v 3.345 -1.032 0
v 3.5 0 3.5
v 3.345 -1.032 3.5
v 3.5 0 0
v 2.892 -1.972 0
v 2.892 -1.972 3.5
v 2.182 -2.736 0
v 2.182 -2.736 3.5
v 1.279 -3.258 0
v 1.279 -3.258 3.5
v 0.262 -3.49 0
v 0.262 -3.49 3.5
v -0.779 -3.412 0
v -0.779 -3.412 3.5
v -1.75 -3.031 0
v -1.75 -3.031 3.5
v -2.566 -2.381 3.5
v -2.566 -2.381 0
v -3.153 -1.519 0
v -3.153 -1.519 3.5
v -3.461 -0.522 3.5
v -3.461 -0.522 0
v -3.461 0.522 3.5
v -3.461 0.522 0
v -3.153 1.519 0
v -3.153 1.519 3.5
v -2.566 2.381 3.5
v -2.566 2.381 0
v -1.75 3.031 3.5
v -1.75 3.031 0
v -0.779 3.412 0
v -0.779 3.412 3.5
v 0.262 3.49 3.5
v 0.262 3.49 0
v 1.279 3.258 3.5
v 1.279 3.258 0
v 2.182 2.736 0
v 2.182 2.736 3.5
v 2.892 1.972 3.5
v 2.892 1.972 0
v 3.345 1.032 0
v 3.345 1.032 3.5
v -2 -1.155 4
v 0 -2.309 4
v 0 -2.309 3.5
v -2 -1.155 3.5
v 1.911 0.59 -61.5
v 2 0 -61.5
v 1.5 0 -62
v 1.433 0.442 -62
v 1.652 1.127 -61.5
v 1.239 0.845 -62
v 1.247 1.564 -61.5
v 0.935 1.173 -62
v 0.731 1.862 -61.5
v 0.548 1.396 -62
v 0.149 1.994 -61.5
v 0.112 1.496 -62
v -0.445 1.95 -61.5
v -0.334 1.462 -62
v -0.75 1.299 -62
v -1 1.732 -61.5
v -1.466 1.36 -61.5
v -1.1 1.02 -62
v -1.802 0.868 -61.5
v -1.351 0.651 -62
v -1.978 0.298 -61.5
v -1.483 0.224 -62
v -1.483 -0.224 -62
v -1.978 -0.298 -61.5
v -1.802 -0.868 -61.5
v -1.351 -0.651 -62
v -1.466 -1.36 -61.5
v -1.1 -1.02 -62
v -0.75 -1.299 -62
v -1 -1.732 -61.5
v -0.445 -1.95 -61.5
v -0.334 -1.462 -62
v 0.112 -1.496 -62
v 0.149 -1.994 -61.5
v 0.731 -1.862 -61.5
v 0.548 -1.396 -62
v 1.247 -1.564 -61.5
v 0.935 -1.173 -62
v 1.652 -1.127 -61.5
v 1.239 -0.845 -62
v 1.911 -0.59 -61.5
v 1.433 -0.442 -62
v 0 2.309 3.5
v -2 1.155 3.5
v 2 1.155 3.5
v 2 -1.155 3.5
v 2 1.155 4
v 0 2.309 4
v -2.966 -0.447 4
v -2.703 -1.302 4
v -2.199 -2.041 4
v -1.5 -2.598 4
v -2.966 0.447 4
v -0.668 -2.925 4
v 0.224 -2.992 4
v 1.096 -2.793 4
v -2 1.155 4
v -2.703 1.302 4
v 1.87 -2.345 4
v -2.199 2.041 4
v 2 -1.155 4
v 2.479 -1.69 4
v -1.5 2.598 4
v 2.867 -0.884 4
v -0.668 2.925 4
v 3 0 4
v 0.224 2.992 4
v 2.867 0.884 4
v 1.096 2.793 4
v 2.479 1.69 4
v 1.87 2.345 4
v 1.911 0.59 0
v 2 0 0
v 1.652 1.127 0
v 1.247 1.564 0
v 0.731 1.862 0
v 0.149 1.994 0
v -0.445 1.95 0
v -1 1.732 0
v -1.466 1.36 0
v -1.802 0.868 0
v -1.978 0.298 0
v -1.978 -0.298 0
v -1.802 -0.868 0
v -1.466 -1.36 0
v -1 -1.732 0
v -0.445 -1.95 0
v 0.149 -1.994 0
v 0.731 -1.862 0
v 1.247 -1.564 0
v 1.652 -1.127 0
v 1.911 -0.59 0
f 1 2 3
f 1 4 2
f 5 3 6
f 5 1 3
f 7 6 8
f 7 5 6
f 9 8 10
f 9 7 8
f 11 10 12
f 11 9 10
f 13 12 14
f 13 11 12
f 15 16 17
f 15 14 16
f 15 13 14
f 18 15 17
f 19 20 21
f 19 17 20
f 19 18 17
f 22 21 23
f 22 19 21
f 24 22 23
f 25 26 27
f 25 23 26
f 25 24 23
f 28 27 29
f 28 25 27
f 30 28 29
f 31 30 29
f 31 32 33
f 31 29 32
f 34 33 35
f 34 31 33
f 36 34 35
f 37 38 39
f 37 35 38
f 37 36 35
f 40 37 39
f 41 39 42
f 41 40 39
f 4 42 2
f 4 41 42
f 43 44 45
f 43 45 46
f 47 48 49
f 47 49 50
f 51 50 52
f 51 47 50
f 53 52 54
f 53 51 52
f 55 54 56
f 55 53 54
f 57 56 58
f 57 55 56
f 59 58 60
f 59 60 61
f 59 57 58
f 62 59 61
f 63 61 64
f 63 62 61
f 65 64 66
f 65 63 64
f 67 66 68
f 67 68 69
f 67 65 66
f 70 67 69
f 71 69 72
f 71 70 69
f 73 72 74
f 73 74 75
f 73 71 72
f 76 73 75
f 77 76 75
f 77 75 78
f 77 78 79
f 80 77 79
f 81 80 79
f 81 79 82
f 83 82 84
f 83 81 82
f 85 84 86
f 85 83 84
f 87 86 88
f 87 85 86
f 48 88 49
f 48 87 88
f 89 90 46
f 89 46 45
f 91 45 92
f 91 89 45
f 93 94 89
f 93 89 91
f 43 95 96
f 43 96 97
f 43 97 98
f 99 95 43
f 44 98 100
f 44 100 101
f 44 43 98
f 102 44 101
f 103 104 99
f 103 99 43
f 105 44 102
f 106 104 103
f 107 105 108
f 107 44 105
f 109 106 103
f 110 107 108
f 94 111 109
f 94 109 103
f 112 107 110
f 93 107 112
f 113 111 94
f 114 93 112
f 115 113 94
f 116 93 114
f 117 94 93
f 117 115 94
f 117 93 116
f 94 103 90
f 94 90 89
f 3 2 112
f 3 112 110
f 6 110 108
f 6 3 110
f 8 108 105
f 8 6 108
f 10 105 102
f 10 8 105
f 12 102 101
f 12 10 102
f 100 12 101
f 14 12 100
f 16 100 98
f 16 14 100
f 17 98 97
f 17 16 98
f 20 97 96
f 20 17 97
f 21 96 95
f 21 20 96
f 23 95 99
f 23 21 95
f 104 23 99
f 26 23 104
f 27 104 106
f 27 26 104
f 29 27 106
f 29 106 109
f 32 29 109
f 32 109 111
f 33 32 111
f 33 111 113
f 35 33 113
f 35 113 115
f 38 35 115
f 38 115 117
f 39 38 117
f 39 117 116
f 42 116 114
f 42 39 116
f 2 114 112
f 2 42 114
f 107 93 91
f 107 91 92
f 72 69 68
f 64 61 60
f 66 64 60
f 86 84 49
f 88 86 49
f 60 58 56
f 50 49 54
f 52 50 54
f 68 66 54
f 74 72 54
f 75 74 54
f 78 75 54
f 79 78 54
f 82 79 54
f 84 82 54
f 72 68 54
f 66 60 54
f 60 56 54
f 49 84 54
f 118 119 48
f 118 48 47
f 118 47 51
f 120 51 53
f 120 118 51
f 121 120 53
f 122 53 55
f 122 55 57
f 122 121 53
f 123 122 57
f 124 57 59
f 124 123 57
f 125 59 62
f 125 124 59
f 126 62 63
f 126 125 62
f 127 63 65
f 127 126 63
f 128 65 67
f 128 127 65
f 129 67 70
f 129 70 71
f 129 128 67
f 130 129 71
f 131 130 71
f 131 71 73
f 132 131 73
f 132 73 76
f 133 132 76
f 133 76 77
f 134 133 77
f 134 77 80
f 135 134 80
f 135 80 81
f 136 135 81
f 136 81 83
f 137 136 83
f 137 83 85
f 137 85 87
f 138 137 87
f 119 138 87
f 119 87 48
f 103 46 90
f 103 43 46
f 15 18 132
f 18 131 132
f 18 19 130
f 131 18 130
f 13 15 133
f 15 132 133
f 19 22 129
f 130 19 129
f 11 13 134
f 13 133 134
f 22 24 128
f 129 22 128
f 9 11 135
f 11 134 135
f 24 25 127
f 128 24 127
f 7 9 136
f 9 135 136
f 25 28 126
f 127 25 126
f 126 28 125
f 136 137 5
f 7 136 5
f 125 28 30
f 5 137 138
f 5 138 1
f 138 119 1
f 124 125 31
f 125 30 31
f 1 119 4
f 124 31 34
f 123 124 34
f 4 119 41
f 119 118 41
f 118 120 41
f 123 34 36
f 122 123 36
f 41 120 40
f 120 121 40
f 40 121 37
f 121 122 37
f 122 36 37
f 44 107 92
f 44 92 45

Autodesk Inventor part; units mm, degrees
ref_plane "YZ Plane" through (0, 0, 0) normal (1, 0, 0) x (0, 1, 0)
ref_plane "XZ Plane" through (0, 0, 0) normal (0, 1, 0) x (-1, 0, 0)
ref_plane "XY Plane" through (0, 0, 0) normal (0, 0, 1) x (1, 0, 0)
sketch "Sketch1" plane through (0, 0, 0) normal (0, 0, 1) x (1, 0, 0)
  circle A0 centre (0, 0) radius 3.5
  dimension "d0" = 7
extrude "Extrusion1" add sketch "Sketch1" along normal blind 4
sketch "Sketch2" plane through (0, 0, 0) normal (0, 0, 1) x (1, 0, 0)
  circle A0 centre (0, 0) radius 2
  dimension "d3" = 4
extrude "Extrusion2" add sketch "Sketch2" against normal blind 62
chamfer "Chamfer1" distance 0.5 angle 45 2 edges at (-3.5, 0, 4) (-2, 0, -62)
sketch "Sketch3" plane through (0, 0, 4) normal (0, 0, 1) x (1, 0, 0)
  circle A0 centre (0, 0) radius 2 projected
  line L0 (-2, 1.1547) -> (0, 2.3094)
  line L1 (0, 2.3094) -> (2, 1.1547)
  line L2 (2, 1.1547) -> (2, -1.1547)
  line L3 (2, -1.1547) -> (0, -2.3094)
  line L4 (0, -2.3094) -> (-2, -1.1547)
  line L5 (-2, -1.1547) -> (-2, 1.1547)
  point P0 (-2, 0)
extrude "Extrusion3" cut sketch "Sketch3" against normal blind 0.5
properties part number "bolt"
